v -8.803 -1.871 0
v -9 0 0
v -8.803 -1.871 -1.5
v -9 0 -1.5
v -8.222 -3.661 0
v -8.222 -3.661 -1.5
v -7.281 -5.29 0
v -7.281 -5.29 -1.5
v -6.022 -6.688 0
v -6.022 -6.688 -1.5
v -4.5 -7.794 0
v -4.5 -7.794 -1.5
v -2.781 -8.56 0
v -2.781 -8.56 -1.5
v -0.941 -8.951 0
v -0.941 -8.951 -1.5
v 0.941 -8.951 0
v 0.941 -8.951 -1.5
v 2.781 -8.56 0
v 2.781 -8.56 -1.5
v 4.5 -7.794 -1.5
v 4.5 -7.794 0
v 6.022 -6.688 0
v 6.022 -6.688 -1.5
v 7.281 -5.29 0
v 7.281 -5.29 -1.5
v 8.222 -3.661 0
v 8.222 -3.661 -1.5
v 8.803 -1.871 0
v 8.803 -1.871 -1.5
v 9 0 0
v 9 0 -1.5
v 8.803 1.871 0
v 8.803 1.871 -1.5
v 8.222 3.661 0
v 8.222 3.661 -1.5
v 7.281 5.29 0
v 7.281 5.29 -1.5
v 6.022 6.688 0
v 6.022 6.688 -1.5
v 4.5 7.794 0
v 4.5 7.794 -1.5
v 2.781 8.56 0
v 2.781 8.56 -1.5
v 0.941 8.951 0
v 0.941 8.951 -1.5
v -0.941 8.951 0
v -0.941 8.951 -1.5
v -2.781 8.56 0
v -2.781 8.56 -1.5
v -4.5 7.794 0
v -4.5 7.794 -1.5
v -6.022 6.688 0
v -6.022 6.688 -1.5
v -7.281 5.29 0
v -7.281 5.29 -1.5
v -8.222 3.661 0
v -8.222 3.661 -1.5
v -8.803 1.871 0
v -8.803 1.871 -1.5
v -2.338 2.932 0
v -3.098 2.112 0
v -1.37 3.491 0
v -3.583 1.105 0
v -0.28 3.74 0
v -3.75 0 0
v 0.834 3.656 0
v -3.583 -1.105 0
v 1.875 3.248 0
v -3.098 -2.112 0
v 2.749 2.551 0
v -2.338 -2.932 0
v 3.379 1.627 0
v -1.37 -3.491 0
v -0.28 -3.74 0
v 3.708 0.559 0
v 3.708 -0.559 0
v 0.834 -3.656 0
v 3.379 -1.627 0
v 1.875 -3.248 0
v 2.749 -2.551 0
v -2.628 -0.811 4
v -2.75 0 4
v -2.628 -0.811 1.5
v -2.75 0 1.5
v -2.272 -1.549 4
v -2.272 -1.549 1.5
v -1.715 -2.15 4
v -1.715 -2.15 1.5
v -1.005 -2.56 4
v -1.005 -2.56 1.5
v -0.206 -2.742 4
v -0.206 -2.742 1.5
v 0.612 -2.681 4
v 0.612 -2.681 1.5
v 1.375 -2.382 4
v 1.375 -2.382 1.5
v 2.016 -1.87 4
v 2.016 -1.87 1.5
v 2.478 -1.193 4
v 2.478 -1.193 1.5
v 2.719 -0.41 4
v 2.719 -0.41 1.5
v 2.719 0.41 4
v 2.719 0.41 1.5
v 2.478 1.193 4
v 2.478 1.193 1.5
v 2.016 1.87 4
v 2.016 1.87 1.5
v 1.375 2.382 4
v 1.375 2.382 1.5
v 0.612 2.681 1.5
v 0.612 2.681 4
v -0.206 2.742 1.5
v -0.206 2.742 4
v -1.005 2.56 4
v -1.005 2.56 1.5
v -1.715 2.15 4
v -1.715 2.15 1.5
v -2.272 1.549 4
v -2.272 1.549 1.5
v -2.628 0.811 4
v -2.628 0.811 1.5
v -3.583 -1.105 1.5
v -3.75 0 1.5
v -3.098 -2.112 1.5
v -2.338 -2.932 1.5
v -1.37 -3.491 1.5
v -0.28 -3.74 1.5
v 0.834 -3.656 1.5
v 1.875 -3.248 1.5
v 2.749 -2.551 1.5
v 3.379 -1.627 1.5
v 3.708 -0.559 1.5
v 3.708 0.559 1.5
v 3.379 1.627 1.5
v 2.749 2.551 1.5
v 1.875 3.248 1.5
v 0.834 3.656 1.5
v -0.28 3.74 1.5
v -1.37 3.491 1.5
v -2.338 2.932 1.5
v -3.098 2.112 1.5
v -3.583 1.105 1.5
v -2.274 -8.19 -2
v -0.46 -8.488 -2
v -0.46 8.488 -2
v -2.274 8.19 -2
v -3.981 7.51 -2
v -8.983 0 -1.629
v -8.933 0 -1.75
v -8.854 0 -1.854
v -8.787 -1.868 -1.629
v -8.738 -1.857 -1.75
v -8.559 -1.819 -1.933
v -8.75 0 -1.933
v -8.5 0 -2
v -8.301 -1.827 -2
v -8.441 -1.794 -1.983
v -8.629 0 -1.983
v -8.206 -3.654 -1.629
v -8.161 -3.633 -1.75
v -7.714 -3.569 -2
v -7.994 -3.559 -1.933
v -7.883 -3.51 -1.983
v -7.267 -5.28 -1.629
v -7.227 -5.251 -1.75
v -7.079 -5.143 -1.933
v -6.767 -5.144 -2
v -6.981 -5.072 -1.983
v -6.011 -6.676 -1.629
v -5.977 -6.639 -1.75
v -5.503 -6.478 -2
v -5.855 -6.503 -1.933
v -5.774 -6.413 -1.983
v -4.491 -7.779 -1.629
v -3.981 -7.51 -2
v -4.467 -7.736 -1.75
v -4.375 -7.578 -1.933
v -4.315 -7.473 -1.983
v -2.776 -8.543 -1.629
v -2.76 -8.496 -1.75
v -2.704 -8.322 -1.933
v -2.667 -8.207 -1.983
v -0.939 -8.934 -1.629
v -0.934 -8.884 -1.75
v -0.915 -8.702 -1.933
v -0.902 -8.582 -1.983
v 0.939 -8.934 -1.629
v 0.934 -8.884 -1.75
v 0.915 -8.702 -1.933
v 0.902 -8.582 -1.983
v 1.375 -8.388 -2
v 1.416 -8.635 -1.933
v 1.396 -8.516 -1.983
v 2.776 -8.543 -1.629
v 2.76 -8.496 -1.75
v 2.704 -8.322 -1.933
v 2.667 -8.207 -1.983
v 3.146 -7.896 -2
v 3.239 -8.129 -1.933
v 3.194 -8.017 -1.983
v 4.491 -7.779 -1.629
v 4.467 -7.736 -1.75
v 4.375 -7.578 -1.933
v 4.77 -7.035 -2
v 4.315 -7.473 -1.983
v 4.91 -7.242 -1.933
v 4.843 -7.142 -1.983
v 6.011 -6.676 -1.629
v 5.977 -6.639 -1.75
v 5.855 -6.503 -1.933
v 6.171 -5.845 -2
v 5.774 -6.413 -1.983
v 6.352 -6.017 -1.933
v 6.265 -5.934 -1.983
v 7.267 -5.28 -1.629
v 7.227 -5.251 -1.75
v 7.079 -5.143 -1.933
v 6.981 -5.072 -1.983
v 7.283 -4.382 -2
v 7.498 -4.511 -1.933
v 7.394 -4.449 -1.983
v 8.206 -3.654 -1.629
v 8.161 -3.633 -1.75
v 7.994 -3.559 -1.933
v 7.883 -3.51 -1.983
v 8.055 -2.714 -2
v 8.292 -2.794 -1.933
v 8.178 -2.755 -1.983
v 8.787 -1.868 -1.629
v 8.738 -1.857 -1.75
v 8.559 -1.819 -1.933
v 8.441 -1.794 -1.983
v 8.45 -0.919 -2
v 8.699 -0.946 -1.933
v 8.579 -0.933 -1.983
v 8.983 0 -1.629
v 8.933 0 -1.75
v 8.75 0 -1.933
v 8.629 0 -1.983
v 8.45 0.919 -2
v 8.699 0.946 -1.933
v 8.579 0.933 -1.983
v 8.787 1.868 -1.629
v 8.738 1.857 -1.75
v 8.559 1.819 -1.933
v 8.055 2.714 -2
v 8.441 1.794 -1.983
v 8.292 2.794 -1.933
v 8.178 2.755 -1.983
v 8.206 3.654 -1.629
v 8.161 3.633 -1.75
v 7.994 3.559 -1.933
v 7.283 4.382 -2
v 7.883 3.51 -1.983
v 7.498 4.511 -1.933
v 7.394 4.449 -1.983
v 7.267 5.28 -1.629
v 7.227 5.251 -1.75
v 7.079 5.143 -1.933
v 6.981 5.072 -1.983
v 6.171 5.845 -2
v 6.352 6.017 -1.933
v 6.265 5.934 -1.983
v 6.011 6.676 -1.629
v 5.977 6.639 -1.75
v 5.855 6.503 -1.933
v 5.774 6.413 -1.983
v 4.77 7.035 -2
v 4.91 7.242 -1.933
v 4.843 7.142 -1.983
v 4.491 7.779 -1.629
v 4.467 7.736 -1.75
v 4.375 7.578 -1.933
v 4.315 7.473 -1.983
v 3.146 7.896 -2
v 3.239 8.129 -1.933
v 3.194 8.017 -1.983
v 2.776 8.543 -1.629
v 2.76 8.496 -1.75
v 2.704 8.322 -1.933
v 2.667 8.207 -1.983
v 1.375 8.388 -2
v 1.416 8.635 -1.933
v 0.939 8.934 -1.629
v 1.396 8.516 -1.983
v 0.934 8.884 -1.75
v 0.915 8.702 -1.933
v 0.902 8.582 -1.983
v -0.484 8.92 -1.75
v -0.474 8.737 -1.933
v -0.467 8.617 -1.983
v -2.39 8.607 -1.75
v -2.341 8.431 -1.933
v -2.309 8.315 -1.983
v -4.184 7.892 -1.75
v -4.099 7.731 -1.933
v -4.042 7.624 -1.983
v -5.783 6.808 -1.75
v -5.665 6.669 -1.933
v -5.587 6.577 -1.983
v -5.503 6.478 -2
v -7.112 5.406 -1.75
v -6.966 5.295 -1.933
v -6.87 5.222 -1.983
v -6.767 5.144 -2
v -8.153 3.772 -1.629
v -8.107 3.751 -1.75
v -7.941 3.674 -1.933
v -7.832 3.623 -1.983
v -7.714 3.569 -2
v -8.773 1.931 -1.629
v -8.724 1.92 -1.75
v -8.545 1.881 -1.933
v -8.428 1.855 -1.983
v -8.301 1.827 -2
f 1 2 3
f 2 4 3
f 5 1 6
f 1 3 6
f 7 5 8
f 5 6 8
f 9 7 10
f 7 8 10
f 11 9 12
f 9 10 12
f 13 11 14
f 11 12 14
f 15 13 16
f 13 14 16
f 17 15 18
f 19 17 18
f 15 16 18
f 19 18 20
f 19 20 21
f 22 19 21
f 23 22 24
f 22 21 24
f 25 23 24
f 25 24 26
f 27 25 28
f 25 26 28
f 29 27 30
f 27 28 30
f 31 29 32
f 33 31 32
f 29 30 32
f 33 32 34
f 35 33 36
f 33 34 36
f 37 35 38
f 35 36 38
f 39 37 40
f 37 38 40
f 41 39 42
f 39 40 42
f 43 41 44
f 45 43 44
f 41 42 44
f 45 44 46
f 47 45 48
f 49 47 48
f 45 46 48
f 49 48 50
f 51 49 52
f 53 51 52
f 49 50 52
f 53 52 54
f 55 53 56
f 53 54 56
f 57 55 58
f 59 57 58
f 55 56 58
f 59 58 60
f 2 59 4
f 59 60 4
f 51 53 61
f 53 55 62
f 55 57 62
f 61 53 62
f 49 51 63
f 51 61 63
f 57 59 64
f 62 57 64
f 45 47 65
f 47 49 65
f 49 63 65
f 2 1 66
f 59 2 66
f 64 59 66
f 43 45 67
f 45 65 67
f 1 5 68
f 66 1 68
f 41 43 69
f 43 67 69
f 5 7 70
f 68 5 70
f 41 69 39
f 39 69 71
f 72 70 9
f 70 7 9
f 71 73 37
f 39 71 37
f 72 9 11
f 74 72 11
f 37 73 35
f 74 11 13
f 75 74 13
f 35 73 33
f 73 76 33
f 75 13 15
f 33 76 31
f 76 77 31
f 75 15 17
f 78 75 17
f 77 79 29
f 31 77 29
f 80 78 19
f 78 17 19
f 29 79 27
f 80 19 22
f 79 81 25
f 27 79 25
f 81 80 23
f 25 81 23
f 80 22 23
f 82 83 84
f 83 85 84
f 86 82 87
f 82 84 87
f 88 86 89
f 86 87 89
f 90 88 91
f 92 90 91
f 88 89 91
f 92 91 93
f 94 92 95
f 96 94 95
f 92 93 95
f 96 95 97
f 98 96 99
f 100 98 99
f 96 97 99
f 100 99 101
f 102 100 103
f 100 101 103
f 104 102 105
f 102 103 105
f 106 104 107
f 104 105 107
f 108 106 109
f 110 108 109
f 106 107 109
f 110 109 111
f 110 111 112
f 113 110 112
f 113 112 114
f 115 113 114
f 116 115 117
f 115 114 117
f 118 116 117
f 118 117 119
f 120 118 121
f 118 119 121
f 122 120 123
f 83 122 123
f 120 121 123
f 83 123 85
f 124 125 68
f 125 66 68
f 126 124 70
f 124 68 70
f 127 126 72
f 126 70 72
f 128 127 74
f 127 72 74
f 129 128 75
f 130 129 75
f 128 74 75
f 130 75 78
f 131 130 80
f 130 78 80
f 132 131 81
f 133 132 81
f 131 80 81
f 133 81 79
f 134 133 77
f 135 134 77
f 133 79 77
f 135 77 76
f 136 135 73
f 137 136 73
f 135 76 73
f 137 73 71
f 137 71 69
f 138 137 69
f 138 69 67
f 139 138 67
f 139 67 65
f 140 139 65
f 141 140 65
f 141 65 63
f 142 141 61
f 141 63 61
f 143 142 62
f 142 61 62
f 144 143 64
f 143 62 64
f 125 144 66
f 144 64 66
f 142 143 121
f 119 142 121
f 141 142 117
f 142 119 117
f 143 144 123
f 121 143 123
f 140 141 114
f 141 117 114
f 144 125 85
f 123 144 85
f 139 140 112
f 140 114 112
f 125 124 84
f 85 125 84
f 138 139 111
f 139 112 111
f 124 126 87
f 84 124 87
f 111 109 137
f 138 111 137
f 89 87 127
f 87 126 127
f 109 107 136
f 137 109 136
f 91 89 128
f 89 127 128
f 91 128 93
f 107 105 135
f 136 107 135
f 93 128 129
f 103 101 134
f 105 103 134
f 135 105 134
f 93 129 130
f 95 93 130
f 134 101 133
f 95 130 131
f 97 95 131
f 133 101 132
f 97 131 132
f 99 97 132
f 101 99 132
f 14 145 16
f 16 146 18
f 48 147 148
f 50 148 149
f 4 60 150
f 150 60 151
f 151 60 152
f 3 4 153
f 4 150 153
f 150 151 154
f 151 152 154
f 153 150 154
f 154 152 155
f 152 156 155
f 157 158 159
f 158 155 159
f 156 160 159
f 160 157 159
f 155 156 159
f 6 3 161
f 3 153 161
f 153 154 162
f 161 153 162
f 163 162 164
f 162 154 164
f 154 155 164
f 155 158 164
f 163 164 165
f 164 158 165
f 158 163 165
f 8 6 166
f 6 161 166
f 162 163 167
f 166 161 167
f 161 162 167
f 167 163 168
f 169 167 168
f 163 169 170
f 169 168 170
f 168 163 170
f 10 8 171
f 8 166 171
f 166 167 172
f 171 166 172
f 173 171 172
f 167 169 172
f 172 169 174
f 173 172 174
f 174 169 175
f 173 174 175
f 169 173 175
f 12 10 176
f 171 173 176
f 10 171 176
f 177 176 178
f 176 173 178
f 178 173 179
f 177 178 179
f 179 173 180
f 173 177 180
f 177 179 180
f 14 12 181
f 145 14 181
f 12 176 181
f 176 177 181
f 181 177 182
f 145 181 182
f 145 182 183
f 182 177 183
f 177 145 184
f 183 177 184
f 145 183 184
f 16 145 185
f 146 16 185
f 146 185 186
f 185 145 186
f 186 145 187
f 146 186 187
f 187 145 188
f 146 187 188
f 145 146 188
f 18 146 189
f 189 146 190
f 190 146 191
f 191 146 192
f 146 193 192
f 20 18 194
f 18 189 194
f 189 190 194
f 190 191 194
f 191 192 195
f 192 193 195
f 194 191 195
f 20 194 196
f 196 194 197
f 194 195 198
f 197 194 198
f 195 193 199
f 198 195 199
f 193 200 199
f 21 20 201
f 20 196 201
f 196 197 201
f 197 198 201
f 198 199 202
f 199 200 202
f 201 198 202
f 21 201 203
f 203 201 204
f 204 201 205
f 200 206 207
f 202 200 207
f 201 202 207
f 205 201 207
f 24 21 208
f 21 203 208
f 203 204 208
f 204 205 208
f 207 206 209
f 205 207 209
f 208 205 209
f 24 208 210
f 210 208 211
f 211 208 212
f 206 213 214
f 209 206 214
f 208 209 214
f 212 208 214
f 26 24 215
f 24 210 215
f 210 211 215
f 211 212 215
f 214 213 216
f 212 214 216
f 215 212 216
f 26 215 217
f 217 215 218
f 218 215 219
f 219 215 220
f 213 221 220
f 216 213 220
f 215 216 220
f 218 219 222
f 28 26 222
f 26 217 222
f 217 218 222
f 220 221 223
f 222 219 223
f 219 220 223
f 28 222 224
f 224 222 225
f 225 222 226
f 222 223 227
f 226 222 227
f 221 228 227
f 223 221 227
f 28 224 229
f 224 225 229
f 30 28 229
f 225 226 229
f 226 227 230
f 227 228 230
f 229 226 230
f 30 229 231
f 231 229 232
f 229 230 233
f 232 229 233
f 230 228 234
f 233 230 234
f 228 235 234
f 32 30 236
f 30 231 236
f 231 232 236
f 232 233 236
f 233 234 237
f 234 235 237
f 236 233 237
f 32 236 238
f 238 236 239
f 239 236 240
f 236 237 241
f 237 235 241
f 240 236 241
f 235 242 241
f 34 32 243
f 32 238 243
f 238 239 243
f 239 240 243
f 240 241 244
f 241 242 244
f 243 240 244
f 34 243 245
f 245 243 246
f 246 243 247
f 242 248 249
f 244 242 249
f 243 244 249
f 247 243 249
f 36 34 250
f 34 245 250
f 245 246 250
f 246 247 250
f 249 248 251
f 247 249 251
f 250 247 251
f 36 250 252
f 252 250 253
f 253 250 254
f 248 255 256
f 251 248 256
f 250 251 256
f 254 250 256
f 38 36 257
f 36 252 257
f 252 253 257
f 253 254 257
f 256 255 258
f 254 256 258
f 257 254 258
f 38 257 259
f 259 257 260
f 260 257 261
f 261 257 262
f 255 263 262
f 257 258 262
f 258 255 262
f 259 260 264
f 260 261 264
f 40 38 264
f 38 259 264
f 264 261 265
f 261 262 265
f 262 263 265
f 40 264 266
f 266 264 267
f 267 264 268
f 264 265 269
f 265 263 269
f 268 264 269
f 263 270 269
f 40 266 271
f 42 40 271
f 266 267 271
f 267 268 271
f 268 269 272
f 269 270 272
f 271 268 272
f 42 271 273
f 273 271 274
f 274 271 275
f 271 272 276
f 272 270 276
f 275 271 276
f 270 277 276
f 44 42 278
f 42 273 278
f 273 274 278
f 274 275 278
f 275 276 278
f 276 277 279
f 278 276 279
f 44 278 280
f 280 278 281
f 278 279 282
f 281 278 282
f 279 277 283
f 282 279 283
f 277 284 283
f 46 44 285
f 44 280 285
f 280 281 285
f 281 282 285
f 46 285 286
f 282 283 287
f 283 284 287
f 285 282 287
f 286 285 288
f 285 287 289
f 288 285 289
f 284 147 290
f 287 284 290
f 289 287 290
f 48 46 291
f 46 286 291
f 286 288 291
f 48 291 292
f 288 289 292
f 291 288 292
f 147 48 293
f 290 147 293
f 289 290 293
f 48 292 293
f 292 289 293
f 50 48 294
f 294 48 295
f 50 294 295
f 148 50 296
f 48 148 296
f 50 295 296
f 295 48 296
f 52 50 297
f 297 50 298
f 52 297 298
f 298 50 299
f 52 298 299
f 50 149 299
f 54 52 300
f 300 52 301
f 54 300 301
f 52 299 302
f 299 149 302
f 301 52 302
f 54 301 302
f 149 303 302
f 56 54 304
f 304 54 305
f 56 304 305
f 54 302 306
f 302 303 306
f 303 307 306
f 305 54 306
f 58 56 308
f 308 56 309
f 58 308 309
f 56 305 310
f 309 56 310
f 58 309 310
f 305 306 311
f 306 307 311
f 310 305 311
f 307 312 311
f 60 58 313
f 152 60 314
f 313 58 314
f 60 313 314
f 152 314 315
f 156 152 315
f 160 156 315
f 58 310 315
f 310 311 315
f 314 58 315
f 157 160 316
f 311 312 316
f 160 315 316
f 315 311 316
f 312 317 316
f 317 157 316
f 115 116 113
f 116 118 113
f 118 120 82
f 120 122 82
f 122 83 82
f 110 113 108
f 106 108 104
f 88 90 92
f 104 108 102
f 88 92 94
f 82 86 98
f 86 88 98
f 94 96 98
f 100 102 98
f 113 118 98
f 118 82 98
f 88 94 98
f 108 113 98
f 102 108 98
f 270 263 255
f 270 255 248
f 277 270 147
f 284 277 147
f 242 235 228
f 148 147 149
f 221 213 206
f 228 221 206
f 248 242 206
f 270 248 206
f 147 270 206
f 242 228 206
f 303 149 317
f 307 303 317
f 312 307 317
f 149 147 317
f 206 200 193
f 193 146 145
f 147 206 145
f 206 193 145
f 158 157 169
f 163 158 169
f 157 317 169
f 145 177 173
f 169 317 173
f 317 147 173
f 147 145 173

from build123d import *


with BuildPart() as f1:
    # F0 (on Front) → F1 (revolve)
    with BuildSketch(Plane.XZ):
        with BuildLine():
            Line((0, -2), (0, 4))
            Line((0, 4), (-2.75, 4))
            Line((-2.75, 4), (-2.75, 1.5))
            Line((-2.75, 1.5), (-3.75, 1.5))
            Line((-3.75, 1.5), (-3.75, 0))
            Line((-3.75, 0), (-9, 0))
            Line((-9, 0), (-9, -1.5))
            ThreePointArc((-9, -1.5), (-8.853553, -1.853553), (-8.5, -2))
            Line((-8.5, -2), (0, -2))
        make_face()
    revolve(axis=Axis((0, 0, 1), (0, 0, 1)))


solid = f1.part
